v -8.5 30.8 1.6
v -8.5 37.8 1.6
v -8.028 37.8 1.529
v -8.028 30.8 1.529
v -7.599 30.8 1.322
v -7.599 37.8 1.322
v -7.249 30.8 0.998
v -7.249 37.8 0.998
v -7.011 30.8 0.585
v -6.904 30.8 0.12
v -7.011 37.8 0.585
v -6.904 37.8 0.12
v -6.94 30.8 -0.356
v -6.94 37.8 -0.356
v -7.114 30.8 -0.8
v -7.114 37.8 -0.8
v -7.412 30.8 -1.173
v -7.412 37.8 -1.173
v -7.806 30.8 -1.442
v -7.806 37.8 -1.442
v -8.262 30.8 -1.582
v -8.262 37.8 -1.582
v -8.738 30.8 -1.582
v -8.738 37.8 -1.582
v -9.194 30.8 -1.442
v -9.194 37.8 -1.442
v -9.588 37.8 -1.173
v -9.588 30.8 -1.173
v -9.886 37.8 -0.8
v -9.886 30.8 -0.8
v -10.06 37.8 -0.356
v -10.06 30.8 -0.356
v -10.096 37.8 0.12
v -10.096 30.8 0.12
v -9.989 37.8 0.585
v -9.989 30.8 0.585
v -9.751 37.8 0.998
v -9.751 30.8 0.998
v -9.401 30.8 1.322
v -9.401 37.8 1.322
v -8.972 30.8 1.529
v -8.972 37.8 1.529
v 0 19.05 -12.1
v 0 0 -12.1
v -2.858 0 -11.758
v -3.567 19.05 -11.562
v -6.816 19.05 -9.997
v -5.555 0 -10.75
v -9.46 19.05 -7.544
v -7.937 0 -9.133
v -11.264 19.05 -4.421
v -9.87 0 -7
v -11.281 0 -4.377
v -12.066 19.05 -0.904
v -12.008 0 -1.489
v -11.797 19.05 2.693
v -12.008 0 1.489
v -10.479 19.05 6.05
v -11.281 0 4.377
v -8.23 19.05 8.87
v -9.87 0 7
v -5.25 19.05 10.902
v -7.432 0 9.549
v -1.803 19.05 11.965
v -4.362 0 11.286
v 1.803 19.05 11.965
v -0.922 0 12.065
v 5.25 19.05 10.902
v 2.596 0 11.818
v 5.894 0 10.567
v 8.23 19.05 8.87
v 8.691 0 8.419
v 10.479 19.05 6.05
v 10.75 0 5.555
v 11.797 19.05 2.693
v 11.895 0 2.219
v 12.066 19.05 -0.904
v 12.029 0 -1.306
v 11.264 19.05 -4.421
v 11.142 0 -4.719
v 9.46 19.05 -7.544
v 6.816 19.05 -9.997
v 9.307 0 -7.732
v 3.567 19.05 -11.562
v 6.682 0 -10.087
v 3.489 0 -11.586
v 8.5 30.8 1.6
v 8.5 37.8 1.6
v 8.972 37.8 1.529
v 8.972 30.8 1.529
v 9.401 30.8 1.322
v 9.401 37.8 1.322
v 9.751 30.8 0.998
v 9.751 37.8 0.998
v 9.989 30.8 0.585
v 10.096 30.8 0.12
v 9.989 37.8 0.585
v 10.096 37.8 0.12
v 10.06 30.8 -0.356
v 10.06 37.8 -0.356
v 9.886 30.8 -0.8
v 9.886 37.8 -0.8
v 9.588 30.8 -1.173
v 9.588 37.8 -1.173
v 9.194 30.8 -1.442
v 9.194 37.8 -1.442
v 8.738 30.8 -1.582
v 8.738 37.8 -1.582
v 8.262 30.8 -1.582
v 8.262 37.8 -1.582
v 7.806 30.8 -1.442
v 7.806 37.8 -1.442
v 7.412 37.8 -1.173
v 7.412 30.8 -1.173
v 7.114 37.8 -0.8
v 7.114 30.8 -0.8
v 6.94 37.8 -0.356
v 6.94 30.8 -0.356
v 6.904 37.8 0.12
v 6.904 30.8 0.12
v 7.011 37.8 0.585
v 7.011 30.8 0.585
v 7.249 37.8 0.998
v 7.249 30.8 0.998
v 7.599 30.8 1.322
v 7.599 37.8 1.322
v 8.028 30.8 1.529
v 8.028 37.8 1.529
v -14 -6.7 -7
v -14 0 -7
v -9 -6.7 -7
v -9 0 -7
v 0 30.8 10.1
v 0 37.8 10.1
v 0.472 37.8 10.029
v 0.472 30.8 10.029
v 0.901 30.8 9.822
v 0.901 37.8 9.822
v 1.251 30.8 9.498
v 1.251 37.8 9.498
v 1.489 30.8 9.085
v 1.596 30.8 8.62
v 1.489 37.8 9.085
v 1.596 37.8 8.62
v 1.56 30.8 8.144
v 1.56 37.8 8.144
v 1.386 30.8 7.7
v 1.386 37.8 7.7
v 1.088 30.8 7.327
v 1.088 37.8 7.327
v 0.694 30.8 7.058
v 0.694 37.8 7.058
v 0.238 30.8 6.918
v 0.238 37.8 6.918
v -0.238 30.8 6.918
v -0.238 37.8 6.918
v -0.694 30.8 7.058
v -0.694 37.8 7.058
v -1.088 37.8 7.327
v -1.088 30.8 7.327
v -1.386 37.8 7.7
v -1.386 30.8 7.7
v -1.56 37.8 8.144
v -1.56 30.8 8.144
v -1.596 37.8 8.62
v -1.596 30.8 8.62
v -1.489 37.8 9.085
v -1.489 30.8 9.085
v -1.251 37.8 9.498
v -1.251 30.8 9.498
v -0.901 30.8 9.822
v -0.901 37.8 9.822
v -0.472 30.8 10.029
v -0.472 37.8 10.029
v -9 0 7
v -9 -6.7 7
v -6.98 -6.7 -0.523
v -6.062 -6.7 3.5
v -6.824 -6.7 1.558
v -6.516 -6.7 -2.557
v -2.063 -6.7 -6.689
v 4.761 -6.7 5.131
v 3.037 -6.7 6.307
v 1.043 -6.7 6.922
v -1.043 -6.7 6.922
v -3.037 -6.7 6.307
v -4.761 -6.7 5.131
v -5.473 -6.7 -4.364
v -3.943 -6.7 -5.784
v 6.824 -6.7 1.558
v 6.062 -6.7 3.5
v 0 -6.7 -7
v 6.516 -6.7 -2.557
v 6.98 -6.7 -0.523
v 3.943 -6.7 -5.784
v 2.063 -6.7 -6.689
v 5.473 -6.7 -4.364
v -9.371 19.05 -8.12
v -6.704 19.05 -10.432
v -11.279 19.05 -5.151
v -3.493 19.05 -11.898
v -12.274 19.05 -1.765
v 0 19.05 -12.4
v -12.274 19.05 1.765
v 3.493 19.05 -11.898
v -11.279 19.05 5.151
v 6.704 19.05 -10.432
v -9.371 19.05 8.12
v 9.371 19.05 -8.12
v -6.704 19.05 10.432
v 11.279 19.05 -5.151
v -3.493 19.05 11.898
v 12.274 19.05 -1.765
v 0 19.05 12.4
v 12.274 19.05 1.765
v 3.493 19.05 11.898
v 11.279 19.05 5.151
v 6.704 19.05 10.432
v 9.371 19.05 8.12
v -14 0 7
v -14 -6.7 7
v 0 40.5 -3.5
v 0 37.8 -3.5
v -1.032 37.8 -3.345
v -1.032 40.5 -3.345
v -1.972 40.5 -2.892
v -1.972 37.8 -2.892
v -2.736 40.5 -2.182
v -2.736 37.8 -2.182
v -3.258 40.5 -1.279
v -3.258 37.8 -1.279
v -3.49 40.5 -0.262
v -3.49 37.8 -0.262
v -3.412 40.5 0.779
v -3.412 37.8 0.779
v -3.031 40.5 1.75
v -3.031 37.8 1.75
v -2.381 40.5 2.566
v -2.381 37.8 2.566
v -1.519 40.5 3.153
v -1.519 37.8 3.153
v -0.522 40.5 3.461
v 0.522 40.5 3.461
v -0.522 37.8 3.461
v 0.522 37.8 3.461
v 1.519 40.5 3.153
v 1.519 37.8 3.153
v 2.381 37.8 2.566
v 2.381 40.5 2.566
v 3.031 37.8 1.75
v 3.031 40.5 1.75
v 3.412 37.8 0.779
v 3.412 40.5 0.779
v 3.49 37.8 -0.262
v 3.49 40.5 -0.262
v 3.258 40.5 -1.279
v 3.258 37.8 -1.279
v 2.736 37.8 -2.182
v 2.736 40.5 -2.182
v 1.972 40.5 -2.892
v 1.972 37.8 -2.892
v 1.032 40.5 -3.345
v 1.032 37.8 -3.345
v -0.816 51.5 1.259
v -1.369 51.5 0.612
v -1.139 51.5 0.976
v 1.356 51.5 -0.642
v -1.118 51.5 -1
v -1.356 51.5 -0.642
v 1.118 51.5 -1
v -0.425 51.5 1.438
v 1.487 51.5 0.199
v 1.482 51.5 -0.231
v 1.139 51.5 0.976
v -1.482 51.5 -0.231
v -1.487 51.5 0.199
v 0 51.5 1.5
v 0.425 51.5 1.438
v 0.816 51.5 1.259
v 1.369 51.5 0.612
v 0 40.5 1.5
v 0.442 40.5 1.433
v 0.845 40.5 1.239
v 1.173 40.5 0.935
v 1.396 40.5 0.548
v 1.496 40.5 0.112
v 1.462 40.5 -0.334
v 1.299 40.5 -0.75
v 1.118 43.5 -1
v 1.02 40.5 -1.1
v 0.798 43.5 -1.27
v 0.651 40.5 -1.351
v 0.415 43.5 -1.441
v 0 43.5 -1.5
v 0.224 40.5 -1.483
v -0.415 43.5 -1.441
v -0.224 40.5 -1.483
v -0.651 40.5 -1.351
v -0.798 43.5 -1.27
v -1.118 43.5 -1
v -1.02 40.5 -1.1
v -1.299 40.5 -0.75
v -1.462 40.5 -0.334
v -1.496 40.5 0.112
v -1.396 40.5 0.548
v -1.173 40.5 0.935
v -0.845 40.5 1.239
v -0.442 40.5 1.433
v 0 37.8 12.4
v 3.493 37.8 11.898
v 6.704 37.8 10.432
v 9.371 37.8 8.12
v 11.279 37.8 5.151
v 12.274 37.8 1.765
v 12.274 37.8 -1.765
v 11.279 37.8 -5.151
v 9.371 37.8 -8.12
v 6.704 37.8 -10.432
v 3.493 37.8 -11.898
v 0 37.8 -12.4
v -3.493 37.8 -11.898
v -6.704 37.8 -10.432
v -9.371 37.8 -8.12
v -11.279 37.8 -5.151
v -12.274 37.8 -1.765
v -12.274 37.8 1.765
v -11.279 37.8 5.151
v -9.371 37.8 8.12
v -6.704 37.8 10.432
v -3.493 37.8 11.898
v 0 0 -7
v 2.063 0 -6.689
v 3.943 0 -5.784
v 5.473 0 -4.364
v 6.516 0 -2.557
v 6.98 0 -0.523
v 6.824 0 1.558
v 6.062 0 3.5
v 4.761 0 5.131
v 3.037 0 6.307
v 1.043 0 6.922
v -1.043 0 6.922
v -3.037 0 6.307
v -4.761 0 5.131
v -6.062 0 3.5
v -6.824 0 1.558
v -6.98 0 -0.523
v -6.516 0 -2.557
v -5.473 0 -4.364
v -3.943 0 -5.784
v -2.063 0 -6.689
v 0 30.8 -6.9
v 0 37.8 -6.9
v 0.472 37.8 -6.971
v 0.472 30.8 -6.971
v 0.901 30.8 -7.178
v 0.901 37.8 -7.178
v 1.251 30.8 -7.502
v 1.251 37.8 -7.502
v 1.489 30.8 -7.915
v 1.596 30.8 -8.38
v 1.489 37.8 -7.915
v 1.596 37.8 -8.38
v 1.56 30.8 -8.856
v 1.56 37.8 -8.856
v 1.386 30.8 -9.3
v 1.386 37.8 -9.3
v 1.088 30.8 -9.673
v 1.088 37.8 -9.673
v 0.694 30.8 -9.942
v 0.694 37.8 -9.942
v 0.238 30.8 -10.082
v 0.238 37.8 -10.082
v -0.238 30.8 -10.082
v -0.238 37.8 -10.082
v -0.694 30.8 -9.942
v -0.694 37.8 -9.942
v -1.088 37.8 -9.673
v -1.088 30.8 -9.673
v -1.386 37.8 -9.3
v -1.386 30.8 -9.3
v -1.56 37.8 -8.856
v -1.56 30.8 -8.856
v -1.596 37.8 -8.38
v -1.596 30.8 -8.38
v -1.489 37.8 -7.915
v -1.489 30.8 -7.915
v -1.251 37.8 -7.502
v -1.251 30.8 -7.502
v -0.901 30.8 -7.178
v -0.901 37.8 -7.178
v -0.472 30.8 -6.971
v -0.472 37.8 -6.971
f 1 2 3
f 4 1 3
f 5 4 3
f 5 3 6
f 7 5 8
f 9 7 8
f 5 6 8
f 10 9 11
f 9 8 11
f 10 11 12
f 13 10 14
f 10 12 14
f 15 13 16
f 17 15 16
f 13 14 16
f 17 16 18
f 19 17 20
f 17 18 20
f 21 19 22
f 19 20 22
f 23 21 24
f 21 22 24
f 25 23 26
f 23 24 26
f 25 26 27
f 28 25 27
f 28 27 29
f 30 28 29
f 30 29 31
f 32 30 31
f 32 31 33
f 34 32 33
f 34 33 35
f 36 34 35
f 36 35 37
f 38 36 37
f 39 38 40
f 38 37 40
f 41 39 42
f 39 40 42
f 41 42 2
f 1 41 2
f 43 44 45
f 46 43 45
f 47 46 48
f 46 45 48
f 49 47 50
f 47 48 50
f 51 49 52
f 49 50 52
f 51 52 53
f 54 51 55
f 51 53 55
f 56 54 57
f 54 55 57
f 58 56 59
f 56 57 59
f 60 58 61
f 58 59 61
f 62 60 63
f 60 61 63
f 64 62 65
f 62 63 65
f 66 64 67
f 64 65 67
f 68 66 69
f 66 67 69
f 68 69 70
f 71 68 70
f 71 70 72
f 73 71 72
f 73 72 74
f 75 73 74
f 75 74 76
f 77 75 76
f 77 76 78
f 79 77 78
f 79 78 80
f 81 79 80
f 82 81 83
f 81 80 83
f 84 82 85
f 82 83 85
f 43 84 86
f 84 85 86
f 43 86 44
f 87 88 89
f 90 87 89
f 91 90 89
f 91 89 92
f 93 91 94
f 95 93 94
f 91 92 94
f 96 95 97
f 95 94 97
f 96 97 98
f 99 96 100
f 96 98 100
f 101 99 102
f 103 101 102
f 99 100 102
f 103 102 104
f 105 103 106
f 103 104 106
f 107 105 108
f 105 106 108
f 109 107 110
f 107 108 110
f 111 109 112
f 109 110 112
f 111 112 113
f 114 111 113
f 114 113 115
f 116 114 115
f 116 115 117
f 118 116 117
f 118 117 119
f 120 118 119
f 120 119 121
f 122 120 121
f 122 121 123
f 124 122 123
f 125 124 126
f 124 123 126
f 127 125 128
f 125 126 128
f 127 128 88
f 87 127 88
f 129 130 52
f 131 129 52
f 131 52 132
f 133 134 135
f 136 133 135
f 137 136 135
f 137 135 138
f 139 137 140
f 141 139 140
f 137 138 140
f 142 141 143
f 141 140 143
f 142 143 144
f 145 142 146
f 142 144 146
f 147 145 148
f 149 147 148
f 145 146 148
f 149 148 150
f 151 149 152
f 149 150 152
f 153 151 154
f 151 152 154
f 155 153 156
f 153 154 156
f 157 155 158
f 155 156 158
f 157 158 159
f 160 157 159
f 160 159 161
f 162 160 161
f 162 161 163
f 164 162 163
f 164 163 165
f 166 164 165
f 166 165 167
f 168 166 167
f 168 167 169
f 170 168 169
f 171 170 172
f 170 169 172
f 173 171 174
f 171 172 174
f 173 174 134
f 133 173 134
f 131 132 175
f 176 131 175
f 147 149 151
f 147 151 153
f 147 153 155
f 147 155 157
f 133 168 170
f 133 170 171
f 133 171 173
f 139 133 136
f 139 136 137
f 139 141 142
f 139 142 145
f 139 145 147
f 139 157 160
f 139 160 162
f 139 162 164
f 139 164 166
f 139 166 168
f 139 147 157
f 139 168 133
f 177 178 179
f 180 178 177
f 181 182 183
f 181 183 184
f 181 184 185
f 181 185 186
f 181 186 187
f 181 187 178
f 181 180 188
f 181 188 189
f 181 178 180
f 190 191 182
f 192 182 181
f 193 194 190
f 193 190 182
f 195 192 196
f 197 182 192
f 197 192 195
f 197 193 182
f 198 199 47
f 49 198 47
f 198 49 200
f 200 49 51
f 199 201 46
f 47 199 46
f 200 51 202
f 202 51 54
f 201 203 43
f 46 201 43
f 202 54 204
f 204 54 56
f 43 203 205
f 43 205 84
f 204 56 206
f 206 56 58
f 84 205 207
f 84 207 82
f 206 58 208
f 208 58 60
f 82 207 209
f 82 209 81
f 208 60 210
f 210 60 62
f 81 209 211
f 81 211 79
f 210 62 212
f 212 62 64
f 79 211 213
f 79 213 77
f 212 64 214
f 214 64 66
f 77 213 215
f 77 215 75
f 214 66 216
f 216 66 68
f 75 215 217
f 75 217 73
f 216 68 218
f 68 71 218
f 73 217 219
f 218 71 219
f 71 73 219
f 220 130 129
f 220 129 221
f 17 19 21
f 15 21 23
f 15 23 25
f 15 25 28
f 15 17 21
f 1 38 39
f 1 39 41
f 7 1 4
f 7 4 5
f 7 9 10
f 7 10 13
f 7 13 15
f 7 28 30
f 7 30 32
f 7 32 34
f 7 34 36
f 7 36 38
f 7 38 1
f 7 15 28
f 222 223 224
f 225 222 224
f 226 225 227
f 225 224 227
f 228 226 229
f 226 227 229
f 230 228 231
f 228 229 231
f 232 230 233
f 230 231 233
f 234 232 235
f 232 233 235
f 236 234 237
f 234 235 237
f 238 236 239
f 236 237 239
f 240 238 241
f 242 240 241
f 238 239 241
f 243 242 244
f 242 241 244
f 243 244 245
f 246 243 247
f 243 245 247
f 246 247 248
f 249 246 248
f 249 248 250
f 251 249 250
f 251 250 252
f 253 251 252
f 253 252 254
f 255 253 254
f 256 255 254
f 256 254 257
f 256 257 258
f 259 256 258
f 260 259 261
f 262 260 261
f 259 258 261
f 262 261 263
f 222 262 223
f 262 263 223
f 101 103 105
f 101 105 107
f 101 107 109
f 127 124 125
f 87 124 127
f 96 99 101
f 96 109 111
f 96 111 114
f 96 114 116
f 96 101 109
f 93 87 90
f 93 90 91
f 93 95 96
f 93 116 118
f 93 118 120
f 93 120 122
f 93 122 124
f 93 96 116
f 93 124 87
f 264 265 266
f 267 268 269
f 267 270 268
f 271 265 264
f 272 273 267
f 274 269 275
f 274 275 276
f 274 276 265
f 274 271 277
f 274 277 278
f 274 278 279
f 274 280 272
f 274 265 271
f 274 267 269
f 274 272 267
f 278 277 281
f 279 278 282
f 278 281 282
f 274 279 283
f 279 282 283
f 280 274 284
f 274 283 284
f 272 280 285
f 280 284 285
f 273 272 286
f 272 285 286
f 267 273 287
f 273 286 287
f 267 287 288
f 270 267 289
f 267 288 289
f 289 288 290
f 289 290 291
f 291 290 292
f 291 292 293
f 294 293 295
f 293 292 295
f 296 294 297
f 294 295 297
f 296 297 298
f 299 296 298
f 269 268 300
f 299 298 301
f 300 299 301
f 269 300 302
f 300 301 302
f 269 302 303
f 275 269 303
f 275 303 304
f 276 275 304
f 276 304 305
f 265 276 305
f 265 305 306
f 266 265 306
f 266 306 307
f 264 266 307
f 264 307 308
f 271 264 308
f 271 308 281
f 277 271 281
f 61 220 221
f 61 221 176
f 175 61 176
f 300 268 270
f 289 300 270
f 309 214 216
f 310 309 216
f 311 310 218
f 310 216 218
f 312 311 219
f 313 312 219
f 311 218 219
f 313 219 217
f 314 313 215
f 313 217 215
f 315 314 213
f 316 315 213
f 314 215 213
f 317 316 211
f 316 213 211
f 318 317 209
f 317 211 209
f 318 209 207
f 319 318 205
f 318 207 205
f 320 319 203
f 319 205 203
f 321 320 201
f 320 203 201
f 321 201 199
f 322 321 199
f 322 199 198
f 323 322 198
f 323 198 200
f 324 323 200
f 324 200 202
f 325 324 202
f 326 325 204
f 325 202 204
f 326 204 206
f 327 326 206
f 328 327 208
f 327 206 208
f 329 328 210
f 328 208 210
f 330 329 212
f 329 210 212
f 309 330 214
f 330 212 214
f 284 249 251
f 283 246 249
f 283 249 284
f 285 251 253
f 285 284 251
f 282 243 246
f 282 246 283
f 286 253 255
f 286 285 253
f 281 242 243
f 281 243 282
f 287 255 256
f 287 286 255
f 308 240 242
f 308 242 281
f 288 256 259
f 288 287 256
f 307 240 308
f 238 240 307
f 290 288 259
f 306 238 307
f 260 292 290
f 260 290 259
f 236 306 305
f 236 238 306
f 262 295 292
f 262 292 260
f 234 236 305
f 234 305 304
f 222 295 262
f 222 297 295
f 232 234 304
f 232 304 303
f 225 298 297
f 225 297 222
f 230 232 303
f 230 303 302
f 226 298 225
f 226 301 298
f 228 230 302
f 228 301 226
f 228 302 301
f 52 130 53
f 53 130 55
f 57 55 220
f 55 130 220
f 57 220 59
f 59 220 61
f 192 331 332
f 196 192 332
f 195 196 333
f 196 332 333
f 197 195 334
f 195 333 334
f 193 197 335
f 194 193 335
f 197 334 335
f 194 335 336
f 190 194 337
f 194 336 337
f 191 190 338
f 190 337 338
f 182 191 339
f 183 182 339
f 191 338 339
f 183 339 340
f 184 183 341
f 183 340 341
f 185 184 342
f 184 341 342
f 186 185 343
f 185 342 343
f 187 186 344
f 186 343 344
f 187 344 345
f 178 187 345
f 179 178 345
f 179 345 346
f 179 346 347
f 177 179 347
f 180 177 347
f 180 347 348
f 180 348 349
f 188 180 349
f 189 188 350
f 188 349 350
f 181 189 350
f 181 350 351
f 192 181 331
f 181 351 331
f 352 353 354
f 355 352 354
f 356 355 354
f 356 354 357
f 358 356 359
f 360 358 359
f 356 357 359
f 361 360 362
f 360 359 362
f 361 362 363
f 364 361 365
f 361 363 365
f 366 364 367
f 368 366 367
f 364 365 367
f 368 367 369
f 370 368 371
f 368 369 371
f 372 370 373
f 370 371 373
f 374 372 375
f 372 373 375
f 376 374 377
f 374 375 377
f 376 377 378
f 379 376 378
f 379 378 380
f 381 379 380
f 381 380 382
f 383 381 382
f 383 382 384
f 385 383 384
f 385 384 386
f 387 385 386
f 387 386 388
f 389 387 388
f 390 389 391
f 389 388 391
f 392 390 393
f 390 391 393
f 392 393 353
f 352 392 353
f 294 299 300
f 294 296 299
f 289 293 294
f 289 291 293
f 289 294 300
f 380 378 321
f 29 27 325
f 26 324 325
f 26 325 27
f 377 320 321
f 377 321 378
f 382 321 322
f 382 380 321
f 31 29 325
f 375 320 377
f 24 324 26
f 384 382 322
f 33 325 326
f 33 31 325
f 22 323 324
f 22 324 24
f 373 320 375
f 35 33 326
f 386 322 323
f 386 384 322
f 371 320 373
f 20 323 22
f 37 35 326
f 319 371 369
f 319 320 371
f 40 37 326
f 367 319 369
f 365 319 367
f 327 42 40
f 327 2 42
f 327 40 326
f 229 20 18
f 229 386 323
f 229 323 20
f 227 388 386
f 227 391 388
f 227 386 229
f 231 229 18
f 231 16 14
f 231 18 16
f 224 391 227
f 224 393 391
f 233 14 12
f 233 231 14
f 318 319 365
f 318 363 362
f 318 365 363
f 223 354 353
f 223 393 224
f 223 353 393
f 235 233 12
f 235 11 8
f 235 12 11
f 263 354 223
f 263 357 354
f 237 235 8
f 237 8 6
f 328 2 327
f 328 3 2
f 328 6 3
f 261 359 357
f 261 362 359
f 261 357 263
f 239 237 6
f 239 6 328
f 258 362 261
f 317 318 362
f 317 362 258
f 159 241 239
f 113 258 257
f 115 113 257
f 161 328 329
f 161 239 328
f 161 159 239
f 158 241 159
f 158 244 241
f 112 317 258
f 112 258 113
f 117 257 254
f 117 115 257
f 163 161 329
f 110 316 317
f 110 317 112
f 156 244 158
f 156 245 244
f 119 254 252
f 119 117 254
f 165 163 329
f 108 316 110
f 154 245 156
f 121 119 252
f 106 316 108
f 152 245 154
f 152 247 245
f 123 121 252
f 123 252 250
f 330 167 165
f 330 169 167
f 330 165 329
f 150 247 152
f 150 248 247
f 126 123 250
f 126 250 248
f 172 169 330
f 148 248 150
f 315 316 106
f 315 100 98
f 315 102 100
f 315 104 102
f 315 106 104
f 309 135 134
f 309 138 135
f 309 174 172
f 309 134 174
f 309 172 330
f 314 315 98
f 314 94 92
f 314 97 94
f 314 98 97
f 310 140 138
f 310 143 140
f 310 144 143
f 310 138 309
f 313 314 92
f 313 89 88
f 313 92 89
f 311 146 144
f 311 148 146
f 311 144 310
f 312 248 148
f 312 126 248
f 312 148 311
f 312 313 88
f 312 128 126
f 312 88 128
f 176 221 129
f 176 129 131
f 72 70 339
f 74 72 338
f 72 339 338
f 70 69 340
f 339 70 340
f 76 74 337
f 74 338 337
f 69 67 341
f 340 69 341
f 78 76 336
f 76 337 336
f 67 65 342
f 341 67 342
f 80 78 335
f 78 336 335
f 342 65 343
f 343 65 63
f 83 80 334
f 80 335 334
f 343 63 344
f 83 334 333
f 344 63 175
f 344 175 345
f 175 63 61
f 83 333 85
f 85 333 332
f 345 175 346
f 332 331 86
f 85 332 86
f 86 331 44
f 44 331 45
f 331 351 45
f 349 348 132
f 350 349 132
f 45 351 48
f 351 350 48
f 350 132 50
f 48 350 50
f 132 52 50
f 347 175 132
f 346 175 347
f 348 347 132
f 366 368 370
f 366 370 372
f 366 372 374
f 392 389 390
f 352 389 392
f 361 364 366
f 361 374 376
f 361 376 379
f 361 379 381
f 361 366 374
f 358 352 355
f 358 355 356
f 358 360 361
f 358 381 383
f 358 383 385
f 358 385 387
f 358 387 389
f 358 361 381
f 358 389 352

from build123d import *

# Parameters (mm, degrees)
SKETCH_2_R          = 12.1
EXTRUDE_1_DEPTH     = 19.05
EXTRUDE_START       = 19.05
SKETCH_2_3_R        = 12.4
SKETCH_2_3_R_2      = 12.1
SKETCH_2_3_R_3      = 3.5
SKETCH_2_3_R_4      = 1.5
EXTRUDE_2_DEPTH     = 18.75
EXTRUDE_START_2     = 37.8
SKETCH_2_4_R        = 3.5
SKETCH_2_4_R_2      = 1.5
EXTRUDE_3_DEPTH     = 2.7
EXTRUDE_START_3     = 40.5
SKETCH_2_5_R        = 1.5
EXTRUDE_4_DEPTH     = 11
SKETCH_4_R          = 1.6
CUT_EXTRUDE_1_DEPTH = 7
SKETCH_5_W          = 5.123568468
SKETCH_5_H          = 1
CUT_EXTRUDE_2_DEPTH = 8
SKETCH_6_R          = 7
SKETCH_6_W          = 5
SKETCH_6_H          = 14
EXTRUDE_5_DEPTH     = 6.7


with BuildPart() as part:
    # 草图2 → 凸台-拉伸1 (new body)
    with BuildSketch(Plane(origin=(0, 0, 0), x_dir=(1, 0, 0), z_dir=(0, 1, 0))):
        with Locations(Location((0, 0, 0), (0, 0, 90))):
            Circle(SKETCH_2_R)
    extrude(amount=EXTRUDE_1_DEPTH)

    # 草图2<3> → 凸台-拉伸2 (add)
    # profile 1 of 4: a face of its own
    with BuildSketch(Plane(origin=(0, 0, 0), x_dir=(1, 0, 0), z_dir=(0, 1, 0)).offset(EXTRUDE_START)):
        with Locations(Location((0, 0, 0), (0, 0, 270))):
            Circle(SKETCH_2_3_R)
        with Locations(Location((0, 0, 0), (0, 0, 90))):
            Circle(SKETCH_2_3_R_2, mode=Mode.SUBTRACT)
    # profile 2 of 4: a face of its own
    with BuildSketch(Plane(origin=(0, 0, 0), x_dir=(1, 0, 0), z_dir=(0, 1, 0)).offset(EXTRUDE_START)):
        with Locations(Location((0, 0, 0), (0, 0, 90))):
            Circle(SKETCH_2_3_R_2)
        Circle(SKETCH_2_3_R_3, mode=Mode.SUBTRACT)
    # profile 3 of 4: a face of its own
    with BuildSketch(Plane(origin=(0, 0, 0), x_dir=(1, 0, 0), z_dir=(0, 1, 0)).offset(EXTRUDE_START)):
        Circle(SKETCH_2_3_R_3)
        Circle(SKETCH_2_3_R_4, mode=Mode.SUBTRACT)
    # profile 4 of 4: a face of its own
    with BuildSketch(Plane(origin=(0, 0, 0), x_dir=(1, 0, 0), z_dir=(0, 1, 0)).offset(EXTRUDE_START)):
        Circle(SKETCH_2_3_R_4)
    extrude(amount=EXTRUDE_2_DEPTH)

    # 草图2<4> → 凸台-拉伸3 (add)
    # profile 1 of 2: a face of its own
    with BuildSketch(Plane(origin=(0, 0, 0), x_dir=(1, 0, 0), z_dir=(0, 1, 0)).offset(EXTRUDE_START_2)):
        with Locations(Location((0, 0, 0), (0, 0, 90))):
            Circle(SKETCH_2_4_R)
        Circle(SKETCH_2_4_R_2, mode=Mode.SUBTRACT)
    # profile 2 of 2: a face of its own
    with BuildSketch(Plane(origin=(0, 0, 0), x_dir=(1, 0, 0), z_dir=(0, 1, 0)).offset(EXTRUDE_START_2)):
        Circle(SKETCH_2_4_R_2)
    extrude(amount=EXTRUDE_3_DEPTH)

    # 草图2<5> → 凸台-拉伸4 (add)
    with BuildSketch(Plane(origin=(0, 0, 0), x_dir=(1, 0, 0), z_dir=(0, 1, 0)).offset(EXTRUDE_START_3)):
        with Locations(Location((0, 0, 0), (0, 0, 270))):
            Circle(SKETCH_2_5_R)
    extrude(amount=EXTRUDE_4_DEPTH)

    # 草图4 → 切除-拉伸1 (cut)
    with BuildSketch(Plane(origin=(0, 37.8, 0), x_dir=(1, 0, 0), z_dir=(0, 1, 0))):
        with Locations(Location((0, 8.5, 0), (0, 0, 270))):
            Circle(SKETCH_4_R)
        with Locations(Location((8.5, 0, 0), (0, 0, 270))):
            Circle(SKETCH_4_R)
        with Locations(Location((0, -8.5, 0), (0, 0, 270))):
            Circle(SKETCH_4_R)
        with Locations(Location((-8.5, 0, 0), (0, 0, 270))):
            Circle(SKETCH_4_R)
    extrude(amount=-CUT_EXTRUDE_1_DEPTH, mode=Mode.SUBTRACT)

    # 草图5 → 切除-拉伸2 (cut)
    with BuildSketch(Plane(origin=(0, 51.5, 0), x_dir=(1, 0, 0), z_dir=(0, 1, 0))):
        with Locations((0, 1.5)):
            Rectangle(SKETCH_5_W, SKETCH_5_H)
    extrude(amount=-CUT_EXTRUDE_2_DEPTH, mode=Mode.SUBTRACT)

    # 草图6 → 凸台-拉伸5 (add)
    with BuildSketch(Plane.XZ):
        with Locations(Location((0, 0, 0), (0, 0, 270))):
            Circle(SKETCH_6_R)
        with Locations((-11.5, 0)):
            Rectangle(SKETCH_6_W, SKETCH_6_H)
    extrude(amount=EXTRUDE_5_DEPTH)


solid = part.part
